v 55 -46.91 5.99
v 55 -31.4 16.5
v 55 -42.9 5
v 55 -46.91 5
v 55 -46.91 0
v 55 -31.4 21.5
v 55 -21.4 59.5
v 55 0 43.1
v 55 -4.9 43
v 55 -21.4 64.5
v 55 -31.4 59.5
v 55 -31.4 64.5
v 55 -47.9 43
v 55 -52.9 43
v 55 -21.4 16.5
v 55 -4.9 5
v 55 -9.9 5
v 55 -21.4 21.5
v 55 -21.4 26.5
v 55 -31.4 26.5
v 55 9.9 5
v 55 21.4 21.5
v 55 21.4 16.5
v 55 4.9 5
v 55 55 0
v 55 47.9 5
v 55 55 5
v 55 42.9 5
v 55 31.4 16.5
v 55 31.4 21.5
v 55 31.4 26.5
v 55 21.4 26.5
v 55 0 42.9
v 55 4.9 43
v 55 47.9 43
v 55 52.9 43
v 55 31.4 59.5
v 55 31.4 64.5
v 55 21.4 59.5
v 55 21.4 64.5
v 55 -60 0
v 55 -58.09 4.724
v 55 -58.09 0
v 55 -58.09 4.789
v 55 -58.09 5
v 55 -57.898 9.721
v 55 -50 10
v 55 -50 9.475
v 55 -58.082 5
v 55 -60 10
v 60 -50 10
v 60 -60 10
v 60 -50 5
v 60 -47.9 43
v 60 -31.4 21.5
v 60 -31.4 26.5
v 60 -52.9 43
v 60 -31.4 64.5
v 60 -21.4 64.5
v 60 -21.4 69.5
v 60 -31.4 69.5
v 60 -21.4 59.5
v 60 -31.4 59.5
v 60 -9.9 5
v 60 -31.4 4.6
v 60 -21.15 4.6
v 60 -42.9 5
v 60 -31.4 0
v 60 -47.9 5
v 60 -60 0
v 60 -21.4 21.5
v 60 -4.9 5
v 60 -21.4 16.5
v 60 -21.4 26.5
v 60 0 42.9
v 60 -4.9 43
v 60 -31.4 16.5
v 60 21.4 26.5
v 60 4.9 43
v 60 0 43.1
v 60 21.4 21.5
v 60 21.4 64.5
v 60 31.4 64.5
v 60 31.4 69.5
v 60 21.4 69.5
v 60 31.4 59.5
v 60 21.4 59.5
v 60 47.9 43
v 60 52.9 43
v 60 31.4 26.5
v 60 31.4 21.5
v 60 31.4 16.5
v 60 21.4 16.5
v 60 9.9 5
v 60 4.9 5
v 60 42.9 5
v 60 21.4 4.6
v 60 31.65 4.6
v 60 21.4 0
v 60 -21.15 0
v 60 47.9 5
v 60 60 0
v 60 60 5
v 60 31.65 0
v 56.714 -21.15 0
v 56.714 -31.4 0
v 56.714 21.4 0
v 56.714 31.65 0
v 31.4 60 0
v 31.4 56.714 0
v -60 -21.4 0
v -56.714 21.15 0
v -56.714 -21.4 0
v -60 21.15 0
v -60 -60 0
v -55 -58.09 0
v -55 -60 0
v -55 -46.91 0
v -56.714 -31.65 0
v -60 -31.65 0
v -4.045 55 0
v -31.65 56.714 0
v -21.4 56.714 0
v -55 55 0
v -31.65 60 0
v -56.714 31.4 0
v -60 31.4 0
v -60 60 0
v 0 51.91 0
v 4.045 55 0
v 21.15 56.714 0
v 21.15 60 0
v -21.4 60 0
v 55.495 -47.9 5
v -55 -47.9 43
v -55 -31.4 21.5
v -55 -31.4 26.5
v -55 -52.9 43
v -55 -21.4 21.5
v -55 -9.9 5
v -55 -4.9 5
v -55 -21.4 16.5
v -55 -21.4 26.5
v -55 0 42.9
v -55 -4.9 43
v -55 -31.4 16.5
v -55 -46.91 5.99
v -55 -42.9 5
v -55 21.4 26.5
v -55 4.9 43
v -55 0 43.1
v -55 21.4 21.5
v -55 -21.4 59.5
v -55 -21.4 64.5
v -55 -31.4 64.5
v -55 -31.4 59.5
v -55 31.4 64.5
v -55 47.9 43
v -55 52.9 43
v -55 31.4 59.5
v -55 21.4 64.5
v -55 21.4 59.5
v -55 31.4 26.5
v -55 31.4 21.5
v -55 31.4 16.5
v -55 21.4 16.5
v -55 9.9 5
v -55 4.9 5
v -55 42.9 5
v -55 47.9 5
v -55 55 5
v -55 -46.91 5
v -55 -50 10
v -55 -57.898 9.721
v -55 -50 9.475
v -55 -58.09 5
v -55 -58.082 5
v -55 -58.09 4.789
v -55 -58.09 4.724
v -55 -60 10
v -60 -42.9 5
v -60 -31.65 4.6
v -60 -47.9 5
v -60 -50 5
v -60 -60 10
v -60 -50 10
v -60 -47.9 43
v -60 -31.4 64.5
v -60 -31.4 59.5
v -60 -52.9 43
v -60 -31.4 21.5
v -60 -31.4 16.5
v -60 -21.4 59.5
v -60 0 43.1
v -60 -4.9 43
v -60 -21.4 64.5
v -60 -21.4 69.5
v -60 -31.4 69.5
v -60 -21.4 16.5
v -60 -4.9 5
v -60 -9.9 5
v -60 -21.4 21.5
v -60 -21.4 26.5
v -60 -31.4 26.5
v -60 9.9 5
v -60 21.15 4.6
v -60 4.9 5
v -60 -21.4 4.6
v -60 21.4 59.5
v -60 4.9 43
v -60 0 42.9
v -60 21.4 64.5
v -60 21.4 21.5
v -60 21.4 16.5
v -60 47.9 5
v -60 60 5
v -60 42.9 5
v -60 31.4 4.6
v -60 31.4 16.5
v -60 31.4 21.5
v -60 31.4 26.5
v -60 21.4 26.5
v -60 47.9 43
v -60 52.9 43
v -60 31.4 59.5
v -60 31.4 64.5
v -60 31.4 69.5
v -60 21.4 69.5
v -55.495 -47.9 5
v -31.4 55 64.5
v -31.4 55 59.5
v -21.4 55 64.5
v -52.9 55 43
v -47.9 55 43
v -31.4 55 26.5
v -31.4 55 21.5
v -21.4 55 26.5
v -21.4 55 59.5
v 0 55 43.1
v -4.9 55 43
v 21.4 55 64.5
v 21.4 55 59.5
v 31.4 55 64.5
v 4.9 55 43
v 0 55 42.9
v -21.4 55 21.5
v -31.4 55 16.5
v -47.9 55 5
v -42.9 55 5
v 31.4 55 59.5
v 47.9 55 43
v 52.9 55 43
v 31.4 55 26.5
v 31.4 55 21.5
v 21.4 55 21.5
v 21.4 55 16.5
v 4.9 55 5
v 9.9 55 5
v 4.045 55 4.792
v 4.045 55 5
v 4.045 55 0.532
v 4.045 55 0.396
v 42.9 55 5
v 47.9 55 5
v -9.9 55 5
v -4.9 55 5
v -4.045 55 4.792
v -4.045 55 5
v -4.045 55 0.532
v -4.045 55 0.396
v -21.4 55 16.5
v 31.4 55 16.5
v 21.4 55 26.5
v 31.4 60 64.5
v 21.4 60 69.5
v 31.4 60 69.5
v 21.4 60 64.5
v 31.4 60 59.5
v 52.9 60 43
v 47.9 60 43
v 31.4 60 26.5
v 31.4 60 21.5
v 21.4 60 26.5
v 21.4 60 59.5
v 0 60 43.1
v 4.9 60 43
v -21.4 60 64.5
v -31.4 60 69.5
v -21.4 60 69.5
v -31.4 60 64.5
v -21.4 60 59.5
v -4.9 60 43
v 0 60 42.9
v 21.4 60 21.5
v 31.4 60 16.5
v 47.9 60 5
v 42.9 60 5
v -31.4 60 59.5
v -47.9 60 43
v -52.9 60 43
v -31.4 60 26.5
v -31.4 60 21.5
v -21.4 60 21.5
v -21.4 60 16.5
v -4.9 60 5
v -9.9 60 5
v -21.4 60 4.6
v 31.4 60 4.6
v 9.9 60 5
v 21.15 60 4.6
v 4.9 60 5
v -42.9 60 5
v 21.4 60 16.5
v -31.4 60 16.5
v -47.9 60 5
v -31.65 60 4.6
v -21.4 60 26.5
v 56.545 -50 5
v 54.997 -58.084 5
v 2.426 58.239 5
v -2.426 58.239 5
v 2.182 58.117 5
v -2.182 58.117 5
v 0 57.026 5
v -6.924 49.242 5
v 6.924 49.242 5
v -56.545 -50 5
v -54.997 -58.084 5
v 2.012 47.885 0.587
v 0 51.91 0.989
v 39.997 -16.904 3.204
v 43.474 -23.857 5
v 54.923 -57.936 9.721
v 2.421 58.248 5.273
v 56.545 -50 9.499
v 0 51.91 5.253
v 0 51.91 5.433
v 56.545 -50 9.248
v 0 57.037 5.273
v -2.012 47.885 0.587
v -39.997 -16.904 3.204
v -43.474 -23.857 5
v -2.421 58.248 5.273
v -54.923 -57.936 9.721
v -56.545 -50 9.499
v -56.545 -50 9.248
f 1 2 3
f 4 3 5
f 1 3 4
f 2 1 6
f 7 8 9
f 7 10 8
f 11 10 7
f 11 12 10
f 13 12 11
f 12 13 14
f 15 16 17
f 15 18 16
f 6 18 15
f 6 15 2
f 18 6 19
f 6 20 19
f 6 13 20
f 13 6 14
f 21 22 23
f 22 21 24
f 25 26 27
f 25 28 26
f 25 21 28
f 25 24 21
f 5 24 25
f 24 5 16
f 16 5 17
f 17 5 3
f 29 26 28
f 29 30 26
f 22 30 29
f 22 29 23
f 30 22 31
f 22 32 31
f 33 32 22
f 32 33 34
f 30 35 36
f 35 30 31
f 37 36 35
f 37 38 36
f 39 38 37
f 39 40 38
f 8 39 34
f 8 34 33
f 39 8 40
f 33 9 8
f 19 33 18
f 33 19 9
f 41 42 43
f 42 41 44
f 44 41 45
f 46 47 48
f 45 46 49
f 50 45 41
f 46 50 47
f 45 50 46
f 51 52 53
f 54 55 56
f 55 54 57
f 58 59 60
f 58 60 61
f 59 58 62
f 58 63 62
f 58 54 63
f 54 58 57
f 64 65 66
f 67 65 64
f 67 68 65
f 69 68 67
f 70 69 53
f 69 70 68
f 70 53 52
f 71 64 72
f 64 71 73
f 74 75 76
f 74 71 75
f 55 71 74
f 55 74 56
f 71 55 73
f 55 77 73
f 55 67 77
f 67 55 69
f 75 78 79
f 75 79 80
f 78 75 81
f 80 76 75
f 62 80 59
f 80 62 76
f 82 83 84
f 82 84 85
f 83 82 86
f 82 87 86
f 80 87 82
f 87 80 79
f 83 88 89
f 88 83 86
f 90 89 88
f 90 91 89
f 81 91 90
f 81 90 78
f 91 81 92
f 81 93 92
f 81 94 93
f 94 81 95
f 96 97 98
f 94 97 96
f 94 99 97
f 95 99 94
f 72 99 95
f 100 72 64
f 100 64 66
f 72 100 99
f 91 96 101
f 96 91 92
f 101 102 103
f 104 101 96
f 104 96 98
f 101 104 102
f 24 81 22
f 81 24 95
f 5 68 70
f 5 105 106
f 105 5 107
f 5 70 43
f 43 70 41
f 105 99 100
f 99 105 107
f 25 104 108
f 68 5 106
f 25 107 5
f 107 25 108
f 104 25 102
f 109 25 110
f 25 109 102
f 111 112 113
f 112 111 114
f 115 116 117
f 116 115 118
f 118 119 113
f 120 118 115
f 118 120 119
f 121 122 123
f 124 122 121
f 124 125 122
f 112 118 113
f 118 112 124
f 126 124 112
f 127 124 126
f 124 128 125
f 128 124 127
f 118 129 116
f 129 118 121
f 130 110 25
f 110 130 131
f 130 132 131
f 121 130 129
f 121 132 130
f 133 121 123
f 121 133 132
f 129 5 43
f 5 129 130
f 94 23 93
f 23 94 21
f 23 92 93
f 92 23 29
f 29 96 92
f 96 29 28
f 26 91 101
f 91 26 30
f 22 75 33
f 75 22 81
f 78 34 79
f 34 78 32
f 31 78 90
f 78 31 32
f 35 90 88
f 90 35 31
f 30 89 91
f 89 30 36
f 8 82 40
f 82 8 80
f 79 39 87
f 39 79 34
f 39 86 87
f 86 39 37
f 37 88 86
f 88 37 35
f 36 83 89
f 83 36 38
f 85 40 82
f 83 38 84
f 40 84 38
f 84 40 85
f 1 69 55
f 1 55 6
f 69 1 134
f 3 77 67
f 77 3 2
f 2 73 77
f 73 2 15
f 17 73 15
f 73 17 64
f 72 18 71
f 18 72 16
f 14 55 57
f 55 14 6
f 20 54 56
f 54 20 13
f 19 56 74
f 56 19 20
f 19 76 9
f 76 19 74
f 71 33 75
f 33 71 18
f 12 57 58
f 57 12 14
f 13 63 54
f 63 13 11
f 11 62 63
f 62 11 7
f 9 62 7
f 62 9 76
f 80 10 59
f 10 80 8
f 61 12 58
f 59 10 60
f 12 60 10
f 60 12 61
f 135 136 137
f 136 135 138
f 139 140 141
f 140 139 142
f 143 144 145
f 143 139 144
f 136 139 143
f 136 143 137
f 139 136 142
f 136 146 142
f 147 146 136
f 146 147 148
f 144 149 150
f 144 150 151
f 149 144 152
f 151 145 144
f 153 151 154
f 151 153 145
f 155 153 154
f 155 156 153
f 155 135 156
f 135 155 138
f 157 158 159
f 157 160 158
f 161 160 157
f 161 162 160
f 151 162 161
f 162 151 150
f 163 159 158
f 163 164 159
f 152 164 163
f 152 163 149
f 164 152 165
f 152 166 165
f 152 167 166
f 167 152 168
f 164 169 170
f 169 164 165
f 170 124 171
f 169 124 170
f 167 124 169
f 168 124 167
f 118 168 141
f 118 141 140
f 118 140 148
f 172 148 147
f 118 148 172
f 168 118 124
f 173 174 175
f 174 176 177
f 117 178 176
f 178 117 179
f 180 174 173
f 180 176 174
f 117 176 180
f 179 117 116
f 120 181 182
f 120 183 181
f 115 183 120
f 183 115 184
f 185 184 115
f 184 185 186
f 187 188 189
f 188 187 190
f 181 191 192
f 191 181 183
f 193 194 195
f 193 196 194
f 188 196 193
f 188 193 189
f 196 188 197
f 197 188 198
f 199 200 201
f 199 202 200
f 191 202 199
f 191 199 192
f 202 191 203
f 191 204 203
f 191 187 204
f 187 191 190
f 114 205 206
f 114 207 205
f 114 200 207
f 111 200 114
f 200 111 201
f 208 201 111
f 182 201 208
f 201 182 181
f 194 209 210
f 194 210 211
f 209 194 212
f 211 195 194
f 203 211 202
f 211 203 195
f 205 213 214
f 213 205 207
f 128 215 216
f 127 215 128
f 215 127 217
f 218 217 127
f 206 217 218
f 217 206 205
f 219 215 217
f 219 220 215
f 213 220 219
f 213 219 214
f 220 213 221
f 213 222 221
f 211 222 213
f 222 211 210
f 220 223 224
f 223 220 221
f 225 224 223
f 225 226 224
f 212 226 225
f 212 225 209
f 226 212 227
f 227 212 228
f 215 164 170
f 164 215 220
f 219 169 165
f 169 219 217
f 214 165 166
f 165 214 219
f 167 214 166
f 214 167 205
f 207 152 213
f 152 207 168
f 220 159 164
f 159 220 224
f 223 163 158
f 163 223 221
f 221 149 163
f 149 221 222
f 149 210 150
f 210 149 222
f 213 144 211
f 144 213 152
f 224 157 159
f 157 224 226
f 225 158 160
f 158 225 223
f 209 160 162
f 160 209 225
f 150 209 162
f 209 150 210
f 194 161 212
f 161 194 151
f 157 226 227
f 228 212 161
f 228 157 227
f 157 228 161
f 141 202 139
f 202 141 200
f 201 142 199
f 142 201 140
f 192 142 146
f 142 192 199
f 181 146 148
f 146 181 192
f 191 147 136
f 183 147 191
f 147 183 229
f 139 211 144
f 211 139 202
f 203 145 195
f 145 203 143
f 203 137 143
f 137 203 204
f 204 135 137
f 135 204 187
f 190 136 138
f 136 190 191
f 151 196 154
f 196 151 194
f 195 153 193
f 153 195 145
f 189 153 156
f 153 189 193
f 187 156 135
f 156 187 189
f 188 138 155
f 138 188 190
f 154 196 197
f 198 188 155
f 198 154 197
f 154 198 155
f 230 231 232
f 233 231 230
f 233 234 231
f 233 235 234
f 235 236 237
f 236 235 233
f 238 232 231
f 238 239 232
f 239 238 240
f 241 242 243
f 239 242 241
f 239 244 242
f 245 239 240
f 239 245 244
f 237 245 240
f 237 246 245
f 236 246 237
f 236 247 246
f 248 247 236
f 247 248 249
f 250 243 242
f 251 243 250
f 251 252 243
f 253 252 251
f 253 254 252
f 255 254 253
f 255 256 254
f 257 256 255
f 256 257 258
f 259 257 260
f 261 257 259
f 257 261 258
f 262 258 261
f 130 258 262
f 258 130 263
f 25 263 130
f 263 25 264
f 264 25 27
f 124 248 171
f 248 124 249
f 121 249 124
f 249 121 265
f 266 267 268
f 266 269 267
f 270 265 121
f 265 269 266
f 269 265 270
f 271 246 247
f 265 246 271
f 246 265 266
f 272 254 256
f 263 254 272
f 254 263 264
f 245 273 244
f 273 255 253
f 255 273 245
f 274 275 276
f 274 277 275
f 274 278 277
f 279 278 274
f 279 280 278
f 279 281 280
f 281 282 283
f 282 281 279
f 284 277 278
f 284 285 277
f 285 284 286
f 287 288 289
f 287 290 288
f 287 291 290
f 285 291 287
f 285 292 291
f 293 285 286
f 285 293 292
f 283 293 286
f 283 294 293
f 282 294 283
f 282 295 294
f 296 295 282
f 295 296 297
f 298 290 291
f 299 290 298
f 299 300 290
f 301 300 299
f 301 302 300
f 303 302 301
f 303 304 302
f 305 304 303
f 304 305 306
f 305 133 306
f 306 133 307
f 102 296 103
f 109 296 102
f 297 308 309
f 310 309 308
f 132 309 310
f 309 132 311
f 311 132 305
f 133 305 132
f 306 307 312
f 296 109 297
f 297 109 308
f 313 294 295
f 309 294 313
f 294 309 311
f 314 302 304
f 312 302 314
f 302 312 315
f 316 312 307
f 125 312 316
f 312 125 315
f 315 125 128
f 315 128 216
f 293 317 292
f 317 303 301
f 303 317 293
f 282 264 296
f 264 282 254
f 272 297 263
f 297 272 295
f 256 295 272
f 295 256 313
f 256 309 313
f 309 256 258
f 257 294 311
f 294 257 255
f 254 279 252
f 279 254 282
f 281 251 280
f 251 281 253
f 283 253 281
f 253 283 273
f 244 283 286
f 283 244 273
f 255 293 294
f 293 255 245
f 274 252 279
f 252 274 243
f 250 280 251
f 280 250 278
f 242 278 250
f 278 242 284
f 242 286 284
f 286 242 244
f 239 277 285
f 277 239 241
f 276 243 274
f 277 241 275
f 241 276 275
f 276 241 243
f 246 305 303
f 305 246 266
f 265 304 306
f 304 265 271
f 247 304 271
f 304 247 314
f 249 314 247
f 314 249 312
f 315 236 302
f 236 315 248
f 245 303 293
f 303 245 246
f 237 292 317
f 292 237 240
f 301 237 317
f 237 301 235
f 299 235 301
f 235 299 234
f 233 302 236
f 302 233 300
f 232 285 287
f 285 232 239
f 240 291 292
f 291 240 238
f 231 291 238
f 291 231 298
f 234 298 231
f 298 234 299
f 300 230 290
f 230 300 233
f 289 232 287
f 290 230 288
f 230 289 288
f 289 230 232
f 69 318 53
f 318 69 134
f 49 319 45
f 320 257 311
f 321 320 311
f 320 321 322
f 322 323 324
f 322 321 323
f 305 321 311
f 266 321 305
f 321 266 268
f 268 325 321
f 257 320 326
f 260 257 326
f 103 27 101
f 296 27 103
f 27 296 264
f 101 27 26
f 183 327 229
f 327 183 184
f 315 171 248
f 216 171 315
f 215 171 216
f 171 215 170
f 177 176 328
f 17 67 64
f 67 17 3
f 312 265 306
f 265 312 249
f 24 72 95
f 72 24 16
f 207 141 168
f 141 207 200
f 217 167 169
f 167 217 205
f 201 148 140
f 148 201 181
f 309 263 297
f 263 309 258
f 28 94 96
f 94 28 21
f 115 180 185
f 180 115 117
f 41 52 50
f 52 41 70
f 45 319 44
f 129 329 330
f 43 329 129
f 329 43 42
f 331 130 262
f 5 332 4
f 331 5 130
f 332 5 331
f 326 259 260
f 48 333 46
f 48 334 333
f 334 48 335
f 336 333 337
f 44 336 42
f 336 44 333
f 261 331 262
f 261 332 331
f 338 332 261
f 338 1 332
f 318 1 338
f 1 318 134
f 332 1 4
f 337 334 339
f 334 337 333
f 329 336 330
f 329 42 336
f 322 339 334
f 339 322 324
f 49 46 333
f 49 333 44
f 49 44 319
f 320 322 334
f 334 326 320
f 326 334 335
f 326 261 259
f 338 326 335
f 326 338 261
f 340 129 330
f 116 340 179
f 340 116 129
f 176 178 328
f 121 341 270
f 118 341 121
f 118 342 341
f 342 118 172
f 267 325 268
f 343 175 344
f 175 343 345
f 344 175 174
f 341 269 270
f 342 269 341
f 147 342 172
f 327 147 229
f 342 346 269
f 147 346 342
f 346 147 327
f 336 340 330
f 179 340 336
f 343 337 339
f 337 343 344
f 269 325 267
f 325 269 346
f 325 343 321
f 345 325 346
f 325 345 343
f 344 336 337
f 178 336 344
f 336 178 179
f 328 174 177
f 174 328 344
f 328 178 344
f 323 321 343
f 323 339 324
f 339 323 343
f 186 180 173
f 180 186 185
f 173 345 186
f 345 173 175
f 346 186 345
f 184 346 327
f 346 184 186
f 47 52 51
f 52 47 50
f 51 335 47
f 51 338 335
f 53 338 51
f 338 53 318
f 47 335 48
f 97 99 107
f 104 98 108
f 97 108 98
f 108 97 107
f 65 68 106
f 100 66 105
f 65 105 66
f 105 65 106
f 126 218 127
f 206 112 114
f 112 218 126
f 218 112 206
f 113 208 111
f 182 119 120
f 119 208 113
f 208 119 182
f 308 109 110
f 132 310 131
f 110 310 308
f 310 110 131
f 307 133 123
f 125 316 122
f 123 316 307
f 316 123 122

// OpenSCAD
$fn=64;
difference(){union(){translate(v = [-57.500, 0])
translate(v = [-2.500, -60.000])
cube(size = [5, 120, 5]);
translate(v = [57.500, 0])
translate(v = [-2.500, -60.000])
cube(size = [5, 120, 5]);
translate(v = [0, 57.500])
rotate(a = [0, 0, 90])
translate(v = [-2.500, -60.000])
cube(size = [5, 120, 5]);
translate(v = [28.750, 0])
rotate(a = [0, 0, 26.565])
translate(v = [-2.500, -63.738])
cube(size = [5, 127.475, 5]);
translate(v = [28.750, 0, 2.500])
rotate(a = [-2, 0, 26.565])
translate(v = [-2.500, -63.738])
cube(size = [5, 127.475, 5]);
translate(v = [-28.750, 0])
rotate(a = [0, 0, -26.565])
translate(v = [-2.500, -63.738])
cube(size = [5, 127.475, 5]);
translate(v = [-28.750, 0, 2.500])
rotate(a = [-2, 0, -26.565])
translate(v = [-2.500, -63.738])
cube(size = [5, 127.475, 5]);
translate(v = [-57.500, -55.000, 5])
translate(v = [-2.500, -5.000])
cube(size = [5, 10, 5]);
translate(v = [57.500, -55.000, 5])
translate(v = [-2.500, -5.000])
cube(size = [5, 10, 5]);
translate(v = [57.500, 26.400])
rotate(a = [0, 0, 180])
union(){union(){union(){translate(v = [2.500, -26.500])
union(){rotate(a = [0, -90, 0])
linear_extrude(height = 5){polygon(points = [[0, 0], [21.500, 21.500], [21.500, 31.500], [0, 53.000], [0, 48.000], [16.500, 31.500], [16.500, 21.500], [0, 5], [0, 0]]);
}
translate(v = [-5, 31.500, 21.500])
rotate(a = [90, 0, 0])
linear_extrude(height = 10){polygon(points = [[0, 0], [5.000, 0.000], [0, 5], [0, 0]]);
}
}
}
translate(v = [0, 0, 21.500])
translate(v = [2.500, -26.500])
translate(v = [-5, 0, 21.500])
rotate(a = [0, 180, 0])
union(){rotate(a = [0, -90, 0])
linear_extrude(height = 5){polygon(points = [[0, 0], [21.500, 21.500], [21.500, 31.500], [0, 53.000], [0, 48.000], [16.500, 31.500], [16.500, 21.500], [0, 5], [0, 0]]);
}
translate(v = [-5, 31.500, 21.500])
rotate(a = [90, 0, 0])
linear_extrude(height = 10){polygon(points = [[0, 0], [5.000, 0.000], [0, 5], [0, 0]]);
}
}
}
translate(v = [0, 0, 43.000])
translate(v = [2.500, -26.500])
union(){rotate(a = [0, -90, 0])
linear_extrude(height = 5){polygon(points = [[0, 0], [21.500, 21.500], [21.500, 31.500], [0, 53.000], [0, 48.000], [16.500, 31.500], [16.500, 21.500], [0, 5], [0, 0]]);
}
translate(v = [-5, 31.500, 21.500])
rotate(a = [90, 0, 0])
linear_extrude(height = 10){polygon(points = [[0, 0], [5.000, 0.000], [0, 5], [0, 0]]);
}
}
}
translate(v = [57.500, -26.400])
rotate(a = [0, 0, 180])
union(){union(){union(){translate(v = [2.500, -26.500])
union(){rotate(a = [0, -90, 0])
linear_extrude(height = 5){polygon(points = [[0, 0], [21.500, 21.500], [21.500, 31.500], [0, 53.000], [0, 48.000], [16.500, 31.500], [16.500, 21.500], [0, 5], [0, 0]]);
}
translate(v = [-5, 31.500, 21.500])
rotate(a = [90, 0, 0])
linear_extrude(height = 10){polygon(points = [[0, 0], [5.000, 0.000], [0, 5], [0, 0]]);
}
}
}
translate(v = [0, 0, 21.500])
translate(v = [2.500, -26.500])
translate(v = [-5, 0, 21.500])
rotate(a = [0, 180, 0])
union(){rotate(a = [0, -90, 0])
linear_extrude(height = 5){polygon(points = [[0, 0], [21.500, 21.500], [21.500, 31.500], [0, 53.000], [0, 48.000], [16.500, 31.500], [16.500, 21.500], [0, 5], [0, 0]]);
}
translate(v = [-5, 31.500, 21.500])
rotate(a = [90, 0, 0])
linear_extrude(height = 10){polygon(points = [[0, 0], [5.000, 0.000], [0, 5], [0, 0]]);
}
}
}
translate(v = [0, 0, 43.000])
translate(v = [2.500, -26.500])
union(){rotate(a = [0, -90, 0])
linear_extrude(height = 5){polygon(points = [[0, 0], [21.500, 21.500], [21.500, 31.500], [0, 53.000], [0, 48.000], [16.500, 31.500], [16.500, 21.500], [0, 5], [0, 0]]);
}
translate(v = [-5, 31.500, 21.500])
rotate(a = [90, 0, 0])
linear_extrude(height = 10){polygon(points = [[0, 0], [5.000, 0.000], [0, 5], [0, 0]]);
}
}
}
translate(v = [-57.500, 26.400])
union(){union(){union(){translate(v = [2.500, -26.500])
union(){rotate(a = [0, -90, 0])
linear_extrude(height = 5){polygon(points = [[0, 0], [21.500, 21.500], [21.500, 31.500], [0, 53.000], [0, 48.000], [16.500, 31.500], [16.500, 21.500], [0, 5], [0, 0]]);
}
translate(v = [-5, 31.500, 21.500])
rotate(a = [90, 0, 0])
linear_extrude(height = 10){polygon(points = [[0, 0], [5.000, 0.000], [0, 5], [0, 0]]);
}
}
}
translate(v = [0, 0, 21.500])
translate(v = [2.500, -26.500])
translate(v = [-5, 0, 21.500])
rotate(a = [0, 180, 0])
union(){rotate(a = [0, -90, 0])
linear_extrude(height = 5){polygon(points = [[0, 0], [21.500, 21.500], [21.500, 31.500], [0, 53.000], [0, 48.000], [16.500, 31.500], [16.500, 21.500], [0, 5], [0, 0]]);
}
translate(v = [-5, 31.500, 21.500])
rotate(a = [90, 0, 0])
linear_extrude(height = 10){polygon(points = [[0, 0], [5.000, 0.000], [0, 5], [0, 0]]);
}
}
}
translate(v = [0, 0, 43.000])
translate(v = [2.500, -26.500])
union(){rotate(a = [0, -90, 0])
linear_extrude(height = 5){polygon(points = [[0, 0], [21.500, 21.500], [21.500, 31.500], [0, 53.000], [0, 48.000], [16.500, 31.500], [16.500, 21.500], [0, 5], [0, 0]]);
}
translate(v = [-5, 31.500, 21.500])
rotate(a = [90, 0, 0])
linear_extrude(height = 10){polygon(points = [[0, 0], [5.000, 0.000], [0, 5], [0, 0]]);
}
}
}
translate(v = [-57.500, -26.400])
union(){union(){union(){translate(v = [2.500, -26.500])
union(){rotate(a = [0, -90, 0])
linear_extrude(height = 5){polygon(points = [[0, 0], [21.500, 21.500], [21.500, 31.500], [0, 53.000], [0, 48.000], [16.500, 31.500], [16.500, 21.500], [0, 5], [0, 0]]);
}
translate(v = [-5, 31.500, 21.500])
rotate(a = [90, 0, 0])
linear_extrude(height = 10){polygon(points = [[0, 0], [5.000, 0.000], [0, 5], [0, 0]]);
}
}
}
translate(v = [0, 0, 21.500])
translate(v = [2.500, -26.500])
translate(v = [-5, 0, 21.500])
rotate(a = [0, 180, 0])
union(){rotate(a = [0, -90, 0])
linear_extrude(height = 5){polygon(points = [[0, 0], [21.500, 21.500], [21.500, 31.500], [0, 53.000], [0, 48.000], [16.500, 31.500], [16.500, 21.500], [0, 5], [0, 0]]);
}
translate(v = [-5, 31.500, 21.500])
rotate(a = [90, 0, 0])
linear_extrude(height = 10){polygon(points = [[0, 0], [5.000, 0.000], [0, 5], [0, 0]]);
}
}
}
translate(v = [0, 0, 43.000])
translate(v = [2.500, -26.500])
union(){rotate(a = [0, -90, 0])
linear_extrude(height = 5){polygon(points = [[0, 0], [21.500, 21.500], [21.500, 31.500], [0, 53.000], [0, 48.000], [16.500, 31.500], [16.500, 21.500], [0, 5], [0, 0]]);
}
translate(v = [-5, 31.500, 21.500])
rotate(a = [90, 0, 0])
linear_extrude(height = 10){polygon(points = [[0, 0], [5.000, 0.000], [0, 5], [0, 0]]);
}
}
}
translate(v = [26.400, 57.500])
rotate(a = [0, 0, -90])
union(){union(){union(){translate(v = [2.500, -26.500])
union(){rotate(a = [0, -90, 0])
linear_extrude(height = 5){polygon(points = [[0, 0], [21.500, 21.500], [21.500, 31.500], [0, 53.000], [0, 48.000], [16.500, 31.500], [16.500, 21.500], [0, 5], [0, 0]]);
}
translate(v = [-5, 31.500, 21.500])
rotate(a = [90, 0, 0])
linear_extrude(height = 10){polygon(points = [[0, 0], [5.000, 0.000], [0, 5], [0, 0]]);
}
}
}
translate(v = [0, 0, 21.500])
translate(v = [2.500, -26.500])
translate(v = [-5, 0, 21.500])
rotate(a = [0, 180, 0])
union(){rotate(a = [0, -90, 0])
linear_extrude(height = 5){polygon(points = [[0, 0], [21.500, 21.500], [21.500, 31.500], [0, 53.000], [0, 48.000], [16.500, 31.500], [16.500, 21.500], [0, 5], [0, 0]]);
}
translate(v = [-5, 31.500, 21.500])
rotate(a = [90, 0, 0])
linear_extrude(height = 10){polygon(points = [[0, 0], [5.000, 0.000], [0, 5], [0, 0]]);
}
}
}
translate(v = [0, 0, 43.000])
translate(v = [2.500, -26.500])
union(){rotate(a = [0, -90, 0])
linear_extrude(height = 5){polygon(points = [[0, 0], [21.500, 21.500], [21.500, 31.500], [0, 53.000], [0, 48.000], [16.500, 31.500], [16.500, 21.500], [0, 5], [0, 0]]);
}
translate(v = [-5, 31.500, 21.500])
rotate(a = [90, 0, 0])
linear_extrude(height = 10){polygon(points = [[0, 0], [5.000, 0.000], [0, 5], [0, 0]]);
}
}
}
translate(v = [-26.400, 57.500])
rotate(a = [0, 0, -90])
union(){union(){union(){translate(v = [2.500, -26.500])
union(){rotate(a = [0, -90, 0])
linear_extrude(height = 5){polygon(points = [[0, 0], [21.500, 21.500], [21.500, 31.500], [0, 53.000], [0, 48.000], [16.500, 31.500], [16.500, 21.500], [0, 5], [0, 0]]);
}
translate(v = [-5, 31.500, 21.500])
rotate(a = [90, 0, 0])
linear_extrude(height = 10){polygon(points = [[0, 0], [5.000, 0.000], [0, 5], [0, 0]]);
}
}
}
translate(v = [0, 0, 21.500])
translate(v = [2.500, -26.500])
translate(v = [-5, 0, 21.500])
rotate(a = [0, 180, 0])
union(){rotate(a = [0, -90, 0])
linear_extrude(height = 5){polygon(points = [[0, 0], [21.500, 21.500], [21.500, 31.500], [0, 53.000], [0, 48.000], [16.500, 31.500], [16.500, 21.500], [0, 5], [0, 0]]);
}
translate(v = [-5, 31.500, 21.500])
rotate(a = [90, 0, 0])
linear_extrude(height = 10){polygon(points = [[0, 0], [5.000, 0.000], [0, 5], [0, 0]]);
}
}
}
translate(v = [0, 0, 43.000])
translate(v = [2.500, -26.500])
union(){rotate(a = [0, -90, 0])
linear_extrude(height = 5){polygon(points = [[0, 0], [21.500, 21.500], [21.500, 31.500], [0, 53.000], [0, 48.000], [16.500, 31.500], [16.500, 21.500], [0, 5], [0, 0]]);
}
translate(v = [-5, 31.500, 21.500])
rotate(a = [90, 0, 0])
linear_extrude(height = 10){polygon(points = [[0, 0], [5.000, 0.000], [0, 5], [0, 0]]);
}
}
}
}
translate(v = [57.500, 26.400, -67.500])
rotate(a = [0, 0, 180])
union(){translate(v = [3.500, -71.625])
union(){rotate(a = [0, -90, 0])
linear_extrude(height = 7){polygon(points = [[0, 0], [66.500, 66.500], [66.500, 76.750], [0, 143.000], [0, 138.000], [61.500, 76.750], [61.500, 66.500], [0, 5], [0, 0]]);
}
translate(v = [-7, 76.625, 66.500])
rotate(a = [90, 0, 0])
linear_extrude(height = 10.250){polygon(points = [[0, 0], [5.000, 0.000], [0, 7], [0, 0]]);
}
}
}
translate(v = [57.500, -26.400, -67.500])
rotate(a = [0, 0, 180])
union(){translate(v = [3.500, -71.625])
union(){rotate(a = [0, -90, 0])
linear_extrude(height = 7){polygon(points = [[0, 0], [66.500, 66.500], [66.500, 76.750], [0, 143.000], [0, 138.000], [61.500, 76.750], [61.500, 66.500], [0, 5], [0, 0]]);
}
translate(v = [-7, 76.625, 66.500])
rotate(a = [90, 0, 0])
linear_extrude(height = 10.250){polygon(points = [[0, 0], [5.000, 0.000], [0, 7], [0, 0]]);
}
}
}
translate(v = [-57.500, 26.400, -67.500])
union(){translate(v = [3.500, -71.625])
union(){rotate(a = [0, -90, 0])
linear_extrude(height = 7){polygon(points = [[0, 0], [66.500, 66.500], [66.500, 76.750], [0, 143.000], [0, 138.000], [61.500, 76.750], [61.500, 66.500], [0, 5], [0, 0]]);
}
translate(v = [-7, 76.625, 66.500])
rotate(a = [90, 0, 0])
linear_extrude(height = 10.250){polygon(points = [[0, 0], [5.000, 0.000], [0, 7], [0, 0]]);
}
}
}
translate(v = [-57.500, -26.400, -67.500])
union(){translate(v = [3.500, -71.625])
union(){rotate(a = [0, -90, 0])
linear_extrude(height = 7){polygon(points = [[0, 0], [66.500, 66.500], [66.500, 76.750], [0, 143.000], [0, 138.000], [61.500, 76.750], [61.500, 66.500], [0, 5], [0, 0]]);
}
translate(v = [-7, 76.625, 66.500])
rotate(a = [90, 0, 0])
linear_extrude(height = 10.250){polygon(points = [[0, 0], [5.000, 0.000], [0, 7], [0, 0]]);
}
}
}
translate(v = [26.400, 57.500, -67.500])
rotate(a = [0, 0, -90])
union(){translate(v = [3.500, -71.625])
union(){rotate(a = [0, -90, 0])
linear_extrude(height = 7){polygon(points = [[0, 0], [66.500, 66.500], [66.500, 76.750], [0, 143.000], [0, 138.000], [61.500, 76.750], [61.500, 66.500], [0, 5], [0, 0]]);
}
translate(v = [-7, 76.625, 66.500])
rotate(a = [90, 0, 0])
linear_extrude(height = 10.250){polygon(points = [[0, 0], [5.000, 0.000], [0, 7], [0, 0]]);
}
}
}
translate(v = [-26.400, 57.500, -67.500])
rotate(a = [0, 0, -90])
union(){translate(v = [3.500, -71.625])
union(){rotate(a = [0, -90, 0])
linear_extrude(height = 7){polygon(points = [[0, 0], [66.500, 66.500], [66.500, 76.750], [0, 143.000], [0, 138.000], [61.500, 76.750], [61.500, 66.500], [0, 5], [0, 0]]);
}
translate(v = [-7, 76.625, 66.500])
rotate(a = [90, 0, 0])
linear_extrude(height = 10.250){polygon(points = [[0, 0], [5.000, 0.000], [0, 7], [0, 0]]);
}
}
}
}
